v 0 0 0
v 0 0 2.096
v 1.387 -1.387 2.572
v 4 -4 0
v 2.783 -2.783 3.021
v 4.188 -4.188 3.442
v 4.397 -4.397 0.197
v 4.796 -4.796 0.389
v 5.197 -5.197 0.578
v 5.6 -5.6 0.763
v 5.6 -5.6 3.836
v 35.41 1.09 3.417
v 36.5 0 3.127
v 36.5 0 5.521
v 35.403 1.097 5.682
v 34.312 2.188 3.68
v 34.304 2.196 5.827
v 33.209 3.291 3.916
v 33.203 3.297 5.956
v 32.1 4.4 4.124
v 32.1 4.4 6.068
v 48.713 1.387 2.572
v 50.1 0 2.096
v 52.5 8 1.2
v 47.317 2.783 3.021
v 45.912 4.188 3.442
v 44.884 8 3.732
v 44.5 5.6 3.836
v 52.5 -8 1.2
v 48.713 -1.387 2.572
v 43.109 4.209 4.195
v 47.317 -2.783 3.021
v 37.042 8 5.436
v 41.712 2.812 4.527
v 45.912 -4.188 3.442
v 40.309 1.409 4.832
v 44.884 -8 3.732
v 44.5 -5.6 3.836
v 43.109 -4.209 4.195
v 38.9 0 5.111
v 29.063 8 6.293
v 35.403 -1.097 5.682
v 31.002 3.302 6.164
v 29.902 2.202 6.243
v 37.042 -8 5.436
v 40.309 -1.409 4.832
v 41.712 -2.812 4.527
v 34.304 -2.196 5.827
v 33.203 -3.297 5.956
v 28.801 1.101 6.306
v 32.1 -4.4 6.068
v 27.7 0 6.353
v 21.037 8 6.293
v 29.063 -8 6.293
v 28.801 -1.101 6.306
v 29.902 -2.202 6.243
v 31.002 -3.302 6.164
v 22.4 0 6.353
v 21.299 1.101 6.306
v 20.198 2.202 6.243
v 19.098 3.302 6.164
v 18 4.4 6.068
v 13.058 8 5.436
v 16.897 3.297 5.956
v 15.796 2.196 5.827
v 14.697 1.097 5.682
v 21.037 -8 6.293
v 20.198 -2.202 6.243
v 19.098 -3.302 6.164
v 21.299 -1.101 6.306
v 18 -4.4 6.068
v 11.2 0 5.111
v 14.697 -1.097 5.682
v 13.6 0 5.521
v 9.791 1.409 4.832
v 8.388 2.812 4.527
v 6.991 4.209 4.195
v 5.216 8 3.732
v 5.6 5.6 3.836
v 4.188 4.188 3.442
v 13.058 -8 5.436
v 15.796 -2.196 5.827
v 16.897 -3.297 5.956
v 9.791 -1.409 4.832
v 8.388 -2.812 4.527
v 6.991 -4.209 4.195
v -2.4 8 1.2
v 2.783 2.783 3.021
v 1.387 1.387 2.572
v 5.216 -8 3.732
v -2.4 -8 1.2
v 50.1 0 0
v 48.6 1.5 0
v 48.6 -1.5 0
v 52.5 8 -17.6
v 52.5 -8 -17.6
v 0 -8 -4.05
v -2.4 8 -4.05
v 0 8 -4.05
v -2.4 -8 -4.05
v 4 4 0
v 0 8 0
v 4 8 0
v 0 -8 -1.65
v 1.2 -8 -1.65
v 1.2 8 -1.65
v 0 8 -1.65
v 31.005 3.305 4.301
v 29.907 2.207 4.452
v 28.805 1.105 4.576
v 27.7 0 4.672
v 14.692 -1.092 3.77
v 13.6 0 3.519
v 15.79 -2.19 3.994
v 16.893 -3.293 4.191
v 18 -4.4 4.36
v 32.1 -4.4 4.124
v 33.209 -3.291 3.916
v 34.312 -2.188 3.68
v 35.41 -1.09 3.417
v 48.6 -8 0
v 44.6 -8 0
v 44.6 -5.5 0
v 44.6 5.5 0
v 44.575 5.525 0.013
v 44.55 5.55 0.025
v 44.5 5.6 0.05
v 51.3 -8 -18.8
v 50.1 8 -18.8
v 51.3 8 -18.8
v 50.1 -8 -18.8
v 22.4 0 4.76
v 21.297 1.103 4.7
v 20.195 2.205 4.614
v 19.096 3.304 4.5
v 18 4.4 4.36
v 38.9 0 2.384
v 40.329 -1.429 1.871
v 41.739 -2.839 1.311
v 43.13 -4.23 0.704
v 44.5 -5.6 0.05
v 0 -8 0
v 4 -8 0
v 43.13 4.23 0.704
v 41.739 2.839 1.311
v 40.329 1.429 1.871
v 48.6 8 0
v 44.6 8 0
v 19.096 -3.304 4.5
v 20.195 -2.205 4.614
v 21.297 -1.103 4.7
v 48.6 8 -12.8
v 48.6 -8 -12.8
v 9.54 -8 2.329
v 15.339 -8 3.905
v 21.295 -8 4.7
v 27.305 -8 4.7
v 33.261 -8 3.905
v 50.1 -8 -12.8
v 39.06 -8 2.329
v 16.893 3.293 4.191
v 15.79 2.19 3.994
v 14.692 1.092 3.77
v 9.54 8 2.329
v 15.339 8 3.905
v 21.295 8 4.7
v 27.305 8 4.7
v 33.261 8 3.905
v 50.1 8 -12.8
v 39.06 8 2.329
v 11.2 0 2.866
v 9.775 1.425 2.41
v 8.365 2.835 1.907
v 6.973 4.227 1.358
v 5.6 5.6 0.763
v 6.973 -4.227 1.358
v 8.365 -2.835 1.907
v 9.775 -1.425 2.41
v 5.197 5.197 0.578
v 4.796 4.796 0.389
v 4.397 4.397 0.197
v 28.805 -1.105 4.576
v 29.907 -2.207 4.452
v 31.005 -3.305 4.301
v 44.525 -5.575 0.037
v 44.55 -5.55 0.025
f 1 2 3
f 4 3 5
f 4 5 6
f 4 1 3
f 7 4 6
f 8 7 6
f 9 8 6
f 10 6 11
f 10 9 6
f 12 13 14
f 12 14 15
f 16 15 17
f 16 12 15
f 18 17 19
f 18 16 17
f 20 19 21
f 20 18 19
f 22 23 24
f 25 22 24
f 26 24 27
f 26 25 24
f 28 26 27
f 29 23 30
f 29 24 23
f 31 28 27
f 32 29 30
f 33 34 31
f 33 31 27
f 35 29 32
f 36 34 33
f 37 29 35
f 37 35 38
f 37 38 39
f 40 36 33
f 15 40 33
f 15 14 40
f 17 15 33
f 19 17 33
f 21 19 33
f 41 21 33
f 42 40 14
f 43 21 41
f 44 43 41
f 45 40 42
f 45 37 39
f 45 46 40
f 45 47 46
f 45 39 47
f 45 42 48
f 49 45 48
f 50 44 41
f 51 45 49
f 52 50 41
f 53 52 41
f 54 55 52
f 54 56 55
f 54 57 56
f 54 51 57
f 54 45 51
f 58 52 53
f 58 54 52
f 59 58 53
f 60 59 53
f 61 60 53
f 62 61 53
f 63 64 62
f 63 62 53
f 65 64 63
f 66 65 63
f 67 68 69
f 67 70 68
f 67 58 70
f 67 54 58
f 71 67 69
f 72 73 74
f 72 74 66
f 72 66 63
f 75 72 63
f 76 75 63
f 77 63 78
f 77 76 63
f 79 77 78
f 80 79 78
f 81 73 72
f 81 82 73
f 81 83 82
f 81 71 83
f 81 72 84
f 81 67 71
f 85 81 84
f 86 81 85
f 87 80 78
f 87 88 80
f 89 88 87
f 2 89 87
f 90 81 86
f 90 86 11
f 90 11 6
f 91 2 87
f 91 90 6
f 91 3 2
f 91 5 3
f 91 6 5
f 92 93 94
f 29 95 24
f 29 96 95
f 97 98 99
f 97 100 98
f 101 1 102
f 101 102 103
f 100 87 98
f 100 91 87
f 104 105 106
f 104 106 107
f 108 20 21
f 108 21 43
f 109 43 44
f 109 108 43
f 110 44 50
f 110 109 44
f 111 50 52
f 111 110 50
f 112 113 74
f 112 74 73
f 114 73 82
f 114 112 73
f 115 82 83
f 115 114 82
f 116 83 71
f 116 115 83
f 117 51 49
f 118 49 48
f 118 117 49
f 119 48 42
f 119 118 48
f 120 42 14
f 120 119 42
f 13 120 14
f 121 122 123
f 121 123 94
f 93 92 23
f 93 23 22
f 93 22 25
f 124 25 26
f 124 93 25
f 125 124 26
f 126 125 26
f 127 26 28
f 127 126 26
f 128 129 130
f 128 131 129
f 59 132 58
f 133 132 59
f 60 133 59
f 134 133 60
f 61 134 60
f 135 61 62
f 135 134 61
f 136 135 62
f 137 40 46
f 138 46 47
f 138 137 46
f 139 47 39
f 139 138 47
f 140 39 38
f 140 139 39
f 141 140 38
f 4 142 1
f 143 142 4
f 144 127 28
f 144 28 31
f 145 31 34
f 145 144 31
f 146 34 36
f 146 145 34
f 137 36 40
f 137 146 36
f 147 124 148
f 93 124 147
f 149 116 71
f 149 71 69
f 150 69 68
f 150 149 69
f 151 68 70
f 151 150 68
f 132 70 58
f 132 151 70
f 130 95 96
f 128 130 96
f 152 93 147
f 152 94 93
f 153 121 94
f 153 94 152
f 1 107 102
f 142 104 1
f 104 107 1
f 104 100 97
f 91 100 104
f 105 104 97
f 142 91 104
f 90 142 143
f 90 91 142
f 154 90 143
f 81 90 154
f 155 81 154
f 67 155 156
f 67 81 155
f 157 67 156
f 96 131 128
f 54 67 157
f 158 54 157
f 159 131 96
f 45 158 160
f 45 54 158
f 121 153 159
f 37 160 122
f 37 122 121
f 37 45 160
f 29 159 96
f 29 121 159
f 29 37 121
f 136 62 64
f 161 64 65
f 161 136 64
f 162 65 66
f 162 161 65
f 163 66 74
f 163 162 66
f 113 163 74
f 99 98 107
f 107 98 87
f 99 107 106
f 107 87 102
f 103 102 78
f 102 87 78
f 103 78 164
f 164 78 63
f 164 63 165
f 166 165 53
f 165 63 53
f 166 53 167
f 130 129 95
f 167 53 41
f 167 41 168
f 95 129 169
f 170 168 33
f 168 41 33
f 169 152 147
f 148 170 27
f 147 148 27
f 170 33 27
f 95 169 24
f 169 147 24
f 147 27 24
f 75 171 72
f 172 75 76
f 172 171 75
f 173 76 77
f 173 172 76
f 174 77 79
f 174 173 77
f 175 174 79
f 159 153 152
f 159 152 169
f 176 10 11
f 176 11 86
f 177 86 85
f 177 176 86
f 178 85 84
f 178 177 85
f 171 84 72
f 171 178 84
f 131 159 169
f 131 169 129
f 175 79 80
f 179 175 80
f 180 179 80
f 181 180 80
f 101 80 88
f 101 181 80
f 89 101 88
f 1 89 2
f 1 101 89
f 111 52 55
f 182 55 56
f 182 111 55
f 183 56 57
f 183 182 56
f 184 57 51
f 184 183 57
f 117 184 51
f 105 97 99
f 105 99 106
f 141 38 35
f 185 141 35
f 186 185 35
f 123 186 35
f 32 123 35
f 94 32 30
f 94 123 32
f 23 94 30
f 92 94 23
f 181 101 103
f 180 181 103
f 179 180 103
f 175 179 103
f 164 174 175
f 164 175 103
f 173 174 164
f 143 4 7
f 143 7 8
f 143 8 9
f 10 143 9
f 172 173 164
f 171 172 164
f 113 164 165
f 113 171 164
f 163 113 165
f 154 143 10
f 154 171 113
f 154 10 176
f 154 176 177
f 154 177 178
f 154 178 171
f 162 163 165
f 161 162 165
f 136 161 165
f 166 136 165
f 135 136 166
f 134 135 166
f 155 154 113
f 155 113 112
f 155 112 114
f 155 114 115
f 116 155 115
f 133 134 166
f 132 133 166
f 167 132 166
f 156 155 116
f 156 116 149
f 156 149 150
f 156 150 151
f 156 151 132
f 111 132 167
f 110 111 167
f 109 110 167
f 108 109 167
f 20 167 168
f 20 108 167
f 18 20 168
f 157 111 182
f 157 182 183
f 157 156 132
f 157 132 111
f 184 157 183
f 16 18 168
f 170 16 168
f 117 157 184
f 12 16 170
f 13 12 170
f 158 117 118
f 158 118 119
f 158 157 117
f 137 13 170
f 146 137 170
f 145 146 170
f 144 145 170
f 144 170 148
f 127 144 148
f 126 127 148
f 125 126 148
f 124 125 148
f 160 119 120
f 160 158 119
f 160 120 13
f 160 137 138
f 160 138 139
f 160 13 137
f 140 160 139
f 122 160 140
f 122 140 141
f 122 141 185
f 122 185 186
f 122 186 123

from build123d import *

# Parameters (mm, degrees)
F2_DEPTH = 8
F4_DEPTH = 6.401
F5_SIZE  = 1.2


with BuildPart() as f2:
    # F1 (on Front) → F2 (new body, symmetric)
    with BuildSketch(Plane.XZ):
        with BuildLine():
            Line((-2.4, -4.05), (0, -4.05))
            Line((0, -4.05), (1.2, -1.65))
            Line((1.2, -1.65), (0, -1.65))
            Line((0, -1.65), (0, 0))
            Line((0, 0), (4, 0))
            ThreePointArc((4, 0), (24.3, 4.8), (44.6, 0))
            Line((44.6, 0), (48.6, 0))
            Line((48.6, 0), (48.6, -12.8))
            Line((48.6, -12.8), (50.1, -12.8))
            Line((50.1, -12.8), (50.1, -18.8))
            Line((50.1, -18.8), (52.5, -18.8))
            Line((52.5, -18.8), (52.5, 1.2))
            ThreePointArc((52.5, 1.2), (25.05, 6.4), (-2.4, 1.2))
            Line((-2.4, 1.2), (-2.4, -4.05))
        make_face()
    extrude(amount=F2_DEPTH, both=True)

    # F3 (on Top) → F4 (cut, through all)
    with BuildSketch(Plane.XY):
        Polygon((5.6, 5.6), (0, 0), (5.6, -5.6), (11.2, 0), align=None)
        Polygon((44.5, 5.6), (38.9, 0), (44.5, -5.6), (50.1, 0), align=None)
        Polygon((36.5, 0), (32.1, 4.4), (27.7, 0), (32.1, -4.4), align=None)
        Polygon((22.4, 0), (18, 4.4), (13.6, 0), (18, -4.4), align=None)
    extrude(amount=F4_DEPTH, mode=Mode.SUBTRACT)

    # F5
    f5_edges = [f2.edges().sort_by_distance(p)[0] for p in [
        (52.5, 0, -18.8),
    ]]
    chamfer(f5_edges, length=F5_SIZE)


solid = f2.part
